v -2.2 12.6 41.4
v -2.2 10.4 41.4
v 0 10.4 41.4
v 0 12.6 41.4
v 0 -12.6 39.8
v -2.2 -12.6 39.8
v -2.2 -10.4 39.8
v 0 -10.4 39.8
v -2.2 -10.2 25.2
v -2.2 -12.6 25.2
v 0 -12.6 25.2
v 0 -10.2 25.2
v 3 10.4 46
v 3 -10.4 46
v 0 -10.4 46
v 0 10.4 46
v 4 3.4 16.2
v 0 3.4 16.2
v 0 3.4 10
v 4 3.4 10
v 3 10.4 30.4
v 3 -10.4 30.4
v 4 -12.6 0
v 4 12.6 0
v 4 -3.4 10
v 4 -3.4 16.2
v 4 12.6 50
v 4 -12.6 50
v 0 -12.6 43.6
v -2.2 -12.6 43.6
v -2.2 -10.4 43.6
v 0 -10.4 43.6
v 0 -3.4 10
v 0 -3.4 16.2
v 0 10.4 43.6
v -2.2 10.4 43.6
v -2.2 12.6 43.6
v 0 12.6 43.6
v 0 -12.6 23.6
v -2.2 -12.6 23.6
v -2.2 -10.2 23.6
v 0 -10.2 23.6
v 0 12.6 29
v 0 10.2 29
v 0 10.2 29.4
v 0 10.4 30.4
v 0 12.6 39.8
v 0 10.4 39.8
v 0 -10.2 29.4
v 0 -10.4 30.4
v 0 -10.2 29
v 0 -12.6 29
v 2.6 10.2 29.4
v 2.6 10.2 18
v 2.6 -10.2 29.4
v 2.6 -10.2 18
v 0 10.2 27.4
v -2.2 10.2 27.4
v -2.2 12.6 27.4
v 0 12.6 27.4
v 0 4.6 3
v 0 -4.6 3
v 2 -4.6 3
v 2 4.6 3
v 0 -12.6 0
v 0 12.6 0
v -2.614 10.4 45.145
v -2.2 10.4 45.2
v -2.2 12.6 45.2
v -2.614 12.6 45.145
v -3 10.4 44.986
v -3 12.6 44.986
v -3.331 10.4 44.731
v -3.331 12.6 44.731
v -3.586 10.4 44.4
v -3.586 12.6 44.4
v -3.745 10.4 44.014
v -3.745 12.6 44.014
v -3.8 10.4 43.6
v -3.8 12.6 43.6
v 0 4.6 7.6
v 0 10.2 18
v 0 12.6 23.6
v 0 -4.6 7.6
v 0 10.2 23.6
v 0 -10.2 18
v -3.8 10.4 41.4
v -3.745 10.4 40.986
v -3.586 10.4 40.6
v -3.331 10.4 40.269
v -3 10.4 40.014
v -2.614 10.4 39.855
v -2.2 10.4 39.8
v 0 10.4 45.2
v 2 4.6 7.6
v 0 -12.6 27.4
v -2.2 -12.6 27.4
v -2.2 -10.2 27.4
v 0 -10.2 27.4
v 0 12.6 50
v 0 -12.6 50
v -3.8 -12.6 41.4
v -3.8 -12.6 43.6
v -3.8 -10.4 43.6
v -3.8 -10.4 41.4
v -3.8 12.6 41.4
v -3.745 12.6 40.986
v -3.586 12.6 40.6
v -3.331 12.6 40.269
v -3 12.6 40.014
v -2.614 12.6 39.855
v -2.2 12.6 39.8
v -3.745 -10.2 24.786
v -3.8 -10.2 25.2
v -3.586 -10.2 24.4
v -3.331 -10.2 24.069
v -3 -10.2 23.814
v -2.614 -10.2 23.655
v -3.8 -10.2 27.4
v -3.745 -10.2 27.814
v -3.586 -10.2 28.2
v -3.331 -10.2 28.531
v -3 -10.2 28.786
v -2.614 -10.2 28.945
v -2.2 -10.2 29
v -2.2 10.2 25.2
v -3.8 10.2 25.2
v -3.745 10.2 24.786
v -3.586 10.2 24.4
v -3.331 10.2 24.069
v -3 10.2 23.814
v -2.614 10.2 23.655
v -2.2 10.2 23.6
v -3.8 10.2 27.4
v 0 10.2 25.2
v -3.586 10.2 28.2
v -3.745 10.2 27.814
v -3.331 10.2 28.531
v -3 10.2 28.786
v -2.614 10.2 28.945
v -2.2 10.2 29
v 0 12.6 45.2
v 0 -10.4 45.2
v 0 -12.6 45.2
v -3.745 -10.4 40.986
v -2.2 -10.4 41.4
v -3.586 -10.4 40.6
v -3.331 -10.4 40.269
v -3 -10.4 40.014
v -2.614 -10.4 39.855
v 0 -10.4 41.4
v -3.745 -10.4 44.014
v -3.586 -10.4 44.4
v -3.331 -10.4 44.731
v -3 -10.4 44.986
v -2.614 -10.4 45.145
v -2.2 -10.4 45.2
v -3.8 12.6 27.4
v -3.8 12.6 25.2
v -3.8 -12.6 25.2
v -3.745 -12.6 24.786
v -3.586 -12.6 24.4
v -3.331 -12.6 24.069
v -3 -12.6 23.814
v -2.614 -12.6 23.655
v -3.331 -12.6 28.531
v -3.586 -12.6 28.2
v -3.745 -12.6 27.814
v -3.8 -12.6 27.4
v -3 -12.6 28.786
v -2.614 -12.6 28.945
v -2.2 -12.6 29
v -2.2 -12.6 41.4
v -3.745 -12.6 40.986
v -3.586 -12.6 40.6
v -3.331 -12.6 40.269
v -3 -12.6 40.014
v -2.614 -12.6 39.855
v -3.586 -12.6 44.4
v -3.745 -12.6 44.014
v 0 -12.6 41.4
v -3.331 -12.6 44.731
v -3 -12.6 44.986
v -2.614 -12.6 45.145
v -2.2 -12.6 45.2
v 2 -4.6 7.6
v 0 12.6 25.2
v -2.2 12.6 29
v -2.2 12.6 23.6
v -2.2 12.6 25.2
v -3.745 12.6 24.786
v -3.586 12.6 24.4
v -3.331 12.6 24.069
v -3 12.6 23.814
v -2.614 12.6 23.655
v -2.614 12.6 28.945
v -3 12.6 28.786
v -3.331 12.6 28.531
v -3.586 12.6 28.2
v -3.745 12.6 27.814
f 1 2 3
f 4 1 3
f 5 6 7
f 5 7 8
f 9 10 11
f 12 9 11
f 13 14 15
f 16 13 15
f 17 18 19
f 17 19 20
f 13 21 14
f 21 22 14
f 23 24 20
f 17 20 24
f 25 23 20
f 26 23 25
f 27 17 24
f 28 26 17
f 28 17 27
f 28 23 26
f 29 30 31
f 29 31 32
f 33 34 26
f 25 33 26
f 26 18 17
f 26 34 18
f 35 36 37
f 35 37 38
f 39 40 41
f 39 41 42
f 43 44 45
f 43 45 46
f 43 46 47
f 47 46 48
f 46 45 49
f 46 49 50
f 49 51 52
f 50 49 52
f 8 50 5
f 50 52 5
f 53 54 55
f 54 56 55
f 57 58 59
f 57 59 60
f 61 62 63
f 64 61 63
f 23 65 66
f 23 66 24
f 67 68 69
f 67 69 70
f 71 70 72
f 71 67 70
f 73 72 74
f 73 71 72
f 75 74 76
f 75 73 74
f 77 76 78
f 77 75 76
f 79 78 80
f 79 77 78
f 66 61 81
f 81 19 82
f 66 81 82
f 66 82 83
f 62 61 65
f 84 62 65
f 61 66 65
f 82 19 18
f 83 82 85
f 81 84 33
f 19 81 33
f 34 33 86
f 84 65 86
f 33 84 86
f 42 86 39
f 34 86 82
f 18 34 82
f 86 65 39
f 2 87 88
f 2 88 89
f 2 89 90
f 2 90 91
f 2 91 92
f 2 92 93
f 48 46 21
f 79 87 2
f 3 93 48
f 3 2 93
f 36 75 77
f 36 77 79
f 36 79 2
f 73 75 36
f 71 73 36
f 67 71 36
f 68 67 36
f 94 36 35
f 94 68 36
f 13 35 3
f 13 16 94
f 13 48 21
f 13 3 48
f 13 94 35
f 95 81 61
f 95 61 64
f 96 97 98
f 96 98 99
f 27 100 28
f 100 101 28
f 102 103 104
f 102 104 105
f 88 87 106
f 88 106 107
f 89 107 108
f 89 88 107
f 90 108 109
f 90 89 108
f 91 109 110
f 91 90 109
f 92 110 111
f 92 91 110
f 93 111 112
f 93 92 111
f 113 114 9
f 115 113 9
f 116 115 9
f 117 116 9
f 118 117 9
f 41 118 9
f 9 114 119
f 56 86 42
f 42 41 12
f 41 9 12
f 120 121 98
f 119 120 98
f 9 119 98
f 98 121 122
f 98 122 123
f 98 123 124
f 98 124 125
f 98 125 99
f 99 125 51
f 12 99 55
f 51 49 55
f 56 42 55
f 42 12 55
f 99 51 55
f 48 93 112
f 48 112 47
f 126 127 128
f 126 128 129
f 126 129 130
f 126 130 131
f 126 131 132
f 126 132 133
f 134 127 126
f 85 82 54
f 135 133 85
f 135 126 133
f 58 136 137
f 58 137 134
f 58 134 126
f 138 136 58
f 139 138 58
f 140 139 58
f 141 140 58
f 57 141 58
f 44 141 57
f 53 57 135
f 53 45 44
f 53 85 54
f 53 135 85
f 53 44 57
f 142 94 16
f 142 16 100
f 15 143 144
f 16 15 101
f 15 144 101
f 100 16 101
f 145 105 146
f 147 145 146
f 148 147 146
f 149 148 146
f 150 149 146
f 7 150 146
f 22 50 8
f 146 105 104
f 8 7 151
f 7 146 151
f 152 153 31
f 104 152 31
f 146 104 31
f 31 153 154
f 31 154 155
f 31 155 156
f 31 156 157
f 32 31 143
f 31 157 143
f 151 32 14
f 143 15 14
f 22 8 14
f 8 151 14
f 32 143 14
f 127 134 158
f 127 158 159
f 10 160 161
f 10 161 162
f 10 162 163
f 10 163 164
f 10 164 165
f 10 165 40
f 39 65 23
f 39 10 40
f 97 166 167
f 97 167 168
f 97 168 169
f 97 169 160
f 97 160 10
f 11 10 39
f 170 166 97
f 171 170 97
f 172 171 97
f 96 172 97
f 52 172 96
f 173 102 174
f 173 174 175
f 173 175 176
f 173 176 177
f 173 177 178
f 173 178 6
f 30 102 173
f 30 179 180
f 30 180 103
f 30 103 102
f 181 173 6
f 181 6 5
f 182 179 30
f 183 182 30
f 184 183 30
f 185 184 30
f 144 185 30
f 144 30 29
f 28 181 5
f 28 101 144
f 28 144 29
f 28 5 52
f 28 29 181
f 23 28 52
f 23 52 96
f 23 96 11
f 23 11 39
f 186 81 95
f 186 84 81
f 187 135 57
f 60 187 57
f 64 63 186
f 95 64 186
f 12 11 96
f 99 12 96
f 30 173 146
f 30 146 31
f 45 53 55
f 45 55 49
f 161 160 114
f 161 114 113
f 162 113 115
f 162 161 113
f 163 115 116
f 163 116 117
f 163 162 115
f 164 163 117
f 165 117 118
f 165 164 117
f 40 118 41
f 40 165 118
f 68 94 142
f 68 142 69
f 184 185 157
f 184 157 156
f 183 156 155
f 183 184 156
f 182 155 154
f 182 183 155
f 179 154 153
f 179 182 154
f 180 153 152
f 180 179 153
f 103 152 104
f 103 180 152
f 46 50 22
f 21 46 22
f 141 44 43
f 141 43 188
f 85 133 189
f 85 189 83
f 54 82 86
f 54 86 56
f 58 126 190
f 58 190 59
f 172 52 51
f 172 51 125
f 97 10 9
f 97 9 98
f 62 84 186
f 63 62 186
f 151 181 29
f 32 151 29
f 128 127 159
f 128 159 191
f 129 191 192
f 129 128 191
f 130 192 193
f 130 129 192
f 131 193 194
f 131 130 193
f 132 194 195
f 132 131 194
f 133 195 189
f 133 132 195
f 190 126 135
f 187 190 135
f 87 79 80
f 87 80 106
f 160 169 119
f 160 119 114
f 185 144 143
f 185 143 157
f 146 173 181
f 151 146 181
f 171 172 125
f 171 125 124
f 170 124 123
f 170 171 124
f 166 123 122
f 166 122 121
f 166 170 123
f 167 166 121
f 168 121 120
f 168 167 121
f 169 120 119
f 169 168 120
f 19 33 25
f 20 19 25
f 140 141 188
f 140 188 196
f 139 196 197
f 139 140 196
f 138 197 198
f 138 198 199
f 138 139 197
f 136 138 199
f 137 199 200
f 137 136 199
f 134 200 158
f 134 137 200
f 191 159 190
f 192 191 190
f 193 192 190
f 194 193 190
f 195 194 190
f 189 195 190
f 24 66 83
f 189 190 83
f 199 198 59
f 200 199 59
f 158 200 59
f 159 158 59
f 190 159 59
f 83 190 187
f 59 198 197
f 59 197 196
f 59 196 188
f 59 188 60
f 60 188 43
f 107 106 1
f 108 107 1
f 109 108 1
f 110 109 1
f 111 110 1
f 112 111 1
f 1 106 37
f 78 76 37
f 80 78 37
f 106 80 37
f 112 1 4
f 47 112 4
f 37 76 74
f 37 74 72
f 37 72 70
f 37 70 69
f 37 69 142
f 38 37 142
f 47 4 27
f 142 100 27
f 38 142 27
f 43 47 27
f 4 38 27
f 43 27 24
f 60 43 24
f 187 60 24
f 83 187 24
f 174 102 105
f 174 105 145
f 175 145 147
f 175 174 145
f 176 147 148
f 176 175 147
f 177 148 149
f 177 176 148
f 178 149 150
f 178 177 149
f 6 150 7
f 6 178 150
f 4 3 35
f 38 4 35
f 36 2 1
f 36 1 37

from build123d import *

# Parameters (mm, degrees)
SKETCH004_W      = 2
SKETCH004_H      = 4.6
EXTRUDE004_DEPTH = 4.6
SKETCH003_W      = 4
SKETCH003_H      = 6.2
EXTRUDE003_DEPTH = 3.4
EXTRUDE002_DEPTH = 10.2
EXTRUDE001_DEPTH = 10.4
SKETCH005_W      = 2.2
SKETCH005_H      = 2.2
EXTRUDE005_DEPTH = 12.6
SKETCH006_W      = 2.2
SKETCH006_H      = 2.2
EXTRUDE006_DEPTH = 12.6
SKETCH_W         = 4
SKETCH_H         = 50
EXTRUDE_DEPTH    = 12.6


with BuildPart() as extrude004_led:
    # Sketch004 → Extrude004 (new body, symmetric)
    with BuildSketch(Plane.XZ):
        with Locations((1, 5.3)):
            Rectangle(SKETCH004_W, SKETCH004_H)
    extrude(amount=EXTRUDE004_DEPTH, both=True)


with BuildPart() as extrude003_pulsante:
    # Sketch003 → Extrude003 (new body, symmetric)
    with BuildSketch(Plane.XZ):
        with Locations((2, 13.1)):
            Rectangle(SKETCH003_W, SKETCH003_H)
    extrude(amount=EXTRUDE003_DEPTH, both=True)


with BuildPart() as extrude002_step_down:
    # Sketch002 → Extrude002 (new body, symmetric)
    with BuildSketch(Plane.XZ):
        Polygon((0, 18), (2.6, 18), (2.6, 29.4), (0, 29.4), (-3.8, 29.4), (-3.8, 18), align=None)
    extrude(amount=EXTRUDE002_DEPTH, both=True)


with BuildPart() as extrude001_power_path:
    # Sketch001 → Extrude001 (new body, symmetric)
    with BuildSketch(Plane.XZ):
        Polygon((0, 30.4), (3, 30.4), (3, 46), (0, 46), (-3.8, 46), (-3.8, 30.4), align=None)
    extrude(amount=EXTRUDE001_DEPTH, both=True)


with BuildPart() as extrude005_fermo_power_path:
    # Sketch005 → Extrude005 (new body, symmetric)
    with BuildSketch(Plane.XZ):
        with BuildLine():
            Line((-3.8, 43.6), (-3.8, 41.4))
            ThreePointArc((-3.8, 41.4), (-3.331371, 40.268629), (-2.2, 39.8))
            Line((-2.2, 39.8), (1.6, 39.8))
            Line((1.6, 39.8), (1.6, 45.2))
            Line((1.6, 45.2), (-2.2, 45.2))
            ThreePointArc((-2.2, 45.2), (-3.331371, 44.731371), (-3.8, 43.6))
        make_face()
        with Locations((-1.1, 42.5)):
            Rectangle(SKETCH005_W, SKETCH005_H, mode=Mode.SUBTRACT)
    extrude(amount=EXTRUDE005_DEPTH, both=True)


with BuildPart() as extrude006_fermo_step_down:
    # Sketch006 → Extrude006 (new body, symmetric)
    with BuildSketch(Plane.XZ):
        with BuildLine():
            Line((-3.8, 27.4), (-3.8, 25.2))
            ThreePointArc((-3.8, 25.2), (-3.331371, 24.068629), (-2.2, 23.6))
            Line((-2.2, 23.6), (1.6, 23.6))
            Line((1.6, 23.6), (1.6, 29))
            Line((1.6, 29), (-2.2, 29))
            ThreePointArc((-2.2, 29), (-3.331371, 28.531371), (-3.8, 27.4))
        make_face()
        with Locations((-1.1, 26.3)):
            Rectangle(SKETCH006_W, SKETCH006_H, mode=Mode.SUBTRACT)
    extrude(amount=EXTRUDE006_DEPTH, both=True)


with BuildPart() as cut003:
    # Sketch → Extrude (new body, symmetric)
    with BuildSketch(Plane.XZ):
        with Locations((2, 25)):
            Rectangle(SKETCH_W, SKETCH_H)
    extrude(amount=EXTRUDE_DEPTH, both=True)

    # Fusion: union Extrude005 - fermo - power-path, Extrude006 - fermo - step-down
    add(extrude005_fermo_power_path.part)
    add(extrude006_fermo_step_down.part)

    # Cut: cut Extrude001 - power - path
    add(extrude001_power_path.part, mode=Mode.SUBTRACT)

    # Cut001: cut Extrude002 - step -down
    add(extrude002_step_down.part, mode=Mode.SUBTRACT)

    # Cut002: cut Extrude003 - pulsante
    add(extrude003_pulsante.part, mode=Mode.SUBTRACT)

    # Cut003: cut Extrude004 - led
    add(extrude004_led.part, mode=Mode.SUBTRACT)


solid = cut003.part
